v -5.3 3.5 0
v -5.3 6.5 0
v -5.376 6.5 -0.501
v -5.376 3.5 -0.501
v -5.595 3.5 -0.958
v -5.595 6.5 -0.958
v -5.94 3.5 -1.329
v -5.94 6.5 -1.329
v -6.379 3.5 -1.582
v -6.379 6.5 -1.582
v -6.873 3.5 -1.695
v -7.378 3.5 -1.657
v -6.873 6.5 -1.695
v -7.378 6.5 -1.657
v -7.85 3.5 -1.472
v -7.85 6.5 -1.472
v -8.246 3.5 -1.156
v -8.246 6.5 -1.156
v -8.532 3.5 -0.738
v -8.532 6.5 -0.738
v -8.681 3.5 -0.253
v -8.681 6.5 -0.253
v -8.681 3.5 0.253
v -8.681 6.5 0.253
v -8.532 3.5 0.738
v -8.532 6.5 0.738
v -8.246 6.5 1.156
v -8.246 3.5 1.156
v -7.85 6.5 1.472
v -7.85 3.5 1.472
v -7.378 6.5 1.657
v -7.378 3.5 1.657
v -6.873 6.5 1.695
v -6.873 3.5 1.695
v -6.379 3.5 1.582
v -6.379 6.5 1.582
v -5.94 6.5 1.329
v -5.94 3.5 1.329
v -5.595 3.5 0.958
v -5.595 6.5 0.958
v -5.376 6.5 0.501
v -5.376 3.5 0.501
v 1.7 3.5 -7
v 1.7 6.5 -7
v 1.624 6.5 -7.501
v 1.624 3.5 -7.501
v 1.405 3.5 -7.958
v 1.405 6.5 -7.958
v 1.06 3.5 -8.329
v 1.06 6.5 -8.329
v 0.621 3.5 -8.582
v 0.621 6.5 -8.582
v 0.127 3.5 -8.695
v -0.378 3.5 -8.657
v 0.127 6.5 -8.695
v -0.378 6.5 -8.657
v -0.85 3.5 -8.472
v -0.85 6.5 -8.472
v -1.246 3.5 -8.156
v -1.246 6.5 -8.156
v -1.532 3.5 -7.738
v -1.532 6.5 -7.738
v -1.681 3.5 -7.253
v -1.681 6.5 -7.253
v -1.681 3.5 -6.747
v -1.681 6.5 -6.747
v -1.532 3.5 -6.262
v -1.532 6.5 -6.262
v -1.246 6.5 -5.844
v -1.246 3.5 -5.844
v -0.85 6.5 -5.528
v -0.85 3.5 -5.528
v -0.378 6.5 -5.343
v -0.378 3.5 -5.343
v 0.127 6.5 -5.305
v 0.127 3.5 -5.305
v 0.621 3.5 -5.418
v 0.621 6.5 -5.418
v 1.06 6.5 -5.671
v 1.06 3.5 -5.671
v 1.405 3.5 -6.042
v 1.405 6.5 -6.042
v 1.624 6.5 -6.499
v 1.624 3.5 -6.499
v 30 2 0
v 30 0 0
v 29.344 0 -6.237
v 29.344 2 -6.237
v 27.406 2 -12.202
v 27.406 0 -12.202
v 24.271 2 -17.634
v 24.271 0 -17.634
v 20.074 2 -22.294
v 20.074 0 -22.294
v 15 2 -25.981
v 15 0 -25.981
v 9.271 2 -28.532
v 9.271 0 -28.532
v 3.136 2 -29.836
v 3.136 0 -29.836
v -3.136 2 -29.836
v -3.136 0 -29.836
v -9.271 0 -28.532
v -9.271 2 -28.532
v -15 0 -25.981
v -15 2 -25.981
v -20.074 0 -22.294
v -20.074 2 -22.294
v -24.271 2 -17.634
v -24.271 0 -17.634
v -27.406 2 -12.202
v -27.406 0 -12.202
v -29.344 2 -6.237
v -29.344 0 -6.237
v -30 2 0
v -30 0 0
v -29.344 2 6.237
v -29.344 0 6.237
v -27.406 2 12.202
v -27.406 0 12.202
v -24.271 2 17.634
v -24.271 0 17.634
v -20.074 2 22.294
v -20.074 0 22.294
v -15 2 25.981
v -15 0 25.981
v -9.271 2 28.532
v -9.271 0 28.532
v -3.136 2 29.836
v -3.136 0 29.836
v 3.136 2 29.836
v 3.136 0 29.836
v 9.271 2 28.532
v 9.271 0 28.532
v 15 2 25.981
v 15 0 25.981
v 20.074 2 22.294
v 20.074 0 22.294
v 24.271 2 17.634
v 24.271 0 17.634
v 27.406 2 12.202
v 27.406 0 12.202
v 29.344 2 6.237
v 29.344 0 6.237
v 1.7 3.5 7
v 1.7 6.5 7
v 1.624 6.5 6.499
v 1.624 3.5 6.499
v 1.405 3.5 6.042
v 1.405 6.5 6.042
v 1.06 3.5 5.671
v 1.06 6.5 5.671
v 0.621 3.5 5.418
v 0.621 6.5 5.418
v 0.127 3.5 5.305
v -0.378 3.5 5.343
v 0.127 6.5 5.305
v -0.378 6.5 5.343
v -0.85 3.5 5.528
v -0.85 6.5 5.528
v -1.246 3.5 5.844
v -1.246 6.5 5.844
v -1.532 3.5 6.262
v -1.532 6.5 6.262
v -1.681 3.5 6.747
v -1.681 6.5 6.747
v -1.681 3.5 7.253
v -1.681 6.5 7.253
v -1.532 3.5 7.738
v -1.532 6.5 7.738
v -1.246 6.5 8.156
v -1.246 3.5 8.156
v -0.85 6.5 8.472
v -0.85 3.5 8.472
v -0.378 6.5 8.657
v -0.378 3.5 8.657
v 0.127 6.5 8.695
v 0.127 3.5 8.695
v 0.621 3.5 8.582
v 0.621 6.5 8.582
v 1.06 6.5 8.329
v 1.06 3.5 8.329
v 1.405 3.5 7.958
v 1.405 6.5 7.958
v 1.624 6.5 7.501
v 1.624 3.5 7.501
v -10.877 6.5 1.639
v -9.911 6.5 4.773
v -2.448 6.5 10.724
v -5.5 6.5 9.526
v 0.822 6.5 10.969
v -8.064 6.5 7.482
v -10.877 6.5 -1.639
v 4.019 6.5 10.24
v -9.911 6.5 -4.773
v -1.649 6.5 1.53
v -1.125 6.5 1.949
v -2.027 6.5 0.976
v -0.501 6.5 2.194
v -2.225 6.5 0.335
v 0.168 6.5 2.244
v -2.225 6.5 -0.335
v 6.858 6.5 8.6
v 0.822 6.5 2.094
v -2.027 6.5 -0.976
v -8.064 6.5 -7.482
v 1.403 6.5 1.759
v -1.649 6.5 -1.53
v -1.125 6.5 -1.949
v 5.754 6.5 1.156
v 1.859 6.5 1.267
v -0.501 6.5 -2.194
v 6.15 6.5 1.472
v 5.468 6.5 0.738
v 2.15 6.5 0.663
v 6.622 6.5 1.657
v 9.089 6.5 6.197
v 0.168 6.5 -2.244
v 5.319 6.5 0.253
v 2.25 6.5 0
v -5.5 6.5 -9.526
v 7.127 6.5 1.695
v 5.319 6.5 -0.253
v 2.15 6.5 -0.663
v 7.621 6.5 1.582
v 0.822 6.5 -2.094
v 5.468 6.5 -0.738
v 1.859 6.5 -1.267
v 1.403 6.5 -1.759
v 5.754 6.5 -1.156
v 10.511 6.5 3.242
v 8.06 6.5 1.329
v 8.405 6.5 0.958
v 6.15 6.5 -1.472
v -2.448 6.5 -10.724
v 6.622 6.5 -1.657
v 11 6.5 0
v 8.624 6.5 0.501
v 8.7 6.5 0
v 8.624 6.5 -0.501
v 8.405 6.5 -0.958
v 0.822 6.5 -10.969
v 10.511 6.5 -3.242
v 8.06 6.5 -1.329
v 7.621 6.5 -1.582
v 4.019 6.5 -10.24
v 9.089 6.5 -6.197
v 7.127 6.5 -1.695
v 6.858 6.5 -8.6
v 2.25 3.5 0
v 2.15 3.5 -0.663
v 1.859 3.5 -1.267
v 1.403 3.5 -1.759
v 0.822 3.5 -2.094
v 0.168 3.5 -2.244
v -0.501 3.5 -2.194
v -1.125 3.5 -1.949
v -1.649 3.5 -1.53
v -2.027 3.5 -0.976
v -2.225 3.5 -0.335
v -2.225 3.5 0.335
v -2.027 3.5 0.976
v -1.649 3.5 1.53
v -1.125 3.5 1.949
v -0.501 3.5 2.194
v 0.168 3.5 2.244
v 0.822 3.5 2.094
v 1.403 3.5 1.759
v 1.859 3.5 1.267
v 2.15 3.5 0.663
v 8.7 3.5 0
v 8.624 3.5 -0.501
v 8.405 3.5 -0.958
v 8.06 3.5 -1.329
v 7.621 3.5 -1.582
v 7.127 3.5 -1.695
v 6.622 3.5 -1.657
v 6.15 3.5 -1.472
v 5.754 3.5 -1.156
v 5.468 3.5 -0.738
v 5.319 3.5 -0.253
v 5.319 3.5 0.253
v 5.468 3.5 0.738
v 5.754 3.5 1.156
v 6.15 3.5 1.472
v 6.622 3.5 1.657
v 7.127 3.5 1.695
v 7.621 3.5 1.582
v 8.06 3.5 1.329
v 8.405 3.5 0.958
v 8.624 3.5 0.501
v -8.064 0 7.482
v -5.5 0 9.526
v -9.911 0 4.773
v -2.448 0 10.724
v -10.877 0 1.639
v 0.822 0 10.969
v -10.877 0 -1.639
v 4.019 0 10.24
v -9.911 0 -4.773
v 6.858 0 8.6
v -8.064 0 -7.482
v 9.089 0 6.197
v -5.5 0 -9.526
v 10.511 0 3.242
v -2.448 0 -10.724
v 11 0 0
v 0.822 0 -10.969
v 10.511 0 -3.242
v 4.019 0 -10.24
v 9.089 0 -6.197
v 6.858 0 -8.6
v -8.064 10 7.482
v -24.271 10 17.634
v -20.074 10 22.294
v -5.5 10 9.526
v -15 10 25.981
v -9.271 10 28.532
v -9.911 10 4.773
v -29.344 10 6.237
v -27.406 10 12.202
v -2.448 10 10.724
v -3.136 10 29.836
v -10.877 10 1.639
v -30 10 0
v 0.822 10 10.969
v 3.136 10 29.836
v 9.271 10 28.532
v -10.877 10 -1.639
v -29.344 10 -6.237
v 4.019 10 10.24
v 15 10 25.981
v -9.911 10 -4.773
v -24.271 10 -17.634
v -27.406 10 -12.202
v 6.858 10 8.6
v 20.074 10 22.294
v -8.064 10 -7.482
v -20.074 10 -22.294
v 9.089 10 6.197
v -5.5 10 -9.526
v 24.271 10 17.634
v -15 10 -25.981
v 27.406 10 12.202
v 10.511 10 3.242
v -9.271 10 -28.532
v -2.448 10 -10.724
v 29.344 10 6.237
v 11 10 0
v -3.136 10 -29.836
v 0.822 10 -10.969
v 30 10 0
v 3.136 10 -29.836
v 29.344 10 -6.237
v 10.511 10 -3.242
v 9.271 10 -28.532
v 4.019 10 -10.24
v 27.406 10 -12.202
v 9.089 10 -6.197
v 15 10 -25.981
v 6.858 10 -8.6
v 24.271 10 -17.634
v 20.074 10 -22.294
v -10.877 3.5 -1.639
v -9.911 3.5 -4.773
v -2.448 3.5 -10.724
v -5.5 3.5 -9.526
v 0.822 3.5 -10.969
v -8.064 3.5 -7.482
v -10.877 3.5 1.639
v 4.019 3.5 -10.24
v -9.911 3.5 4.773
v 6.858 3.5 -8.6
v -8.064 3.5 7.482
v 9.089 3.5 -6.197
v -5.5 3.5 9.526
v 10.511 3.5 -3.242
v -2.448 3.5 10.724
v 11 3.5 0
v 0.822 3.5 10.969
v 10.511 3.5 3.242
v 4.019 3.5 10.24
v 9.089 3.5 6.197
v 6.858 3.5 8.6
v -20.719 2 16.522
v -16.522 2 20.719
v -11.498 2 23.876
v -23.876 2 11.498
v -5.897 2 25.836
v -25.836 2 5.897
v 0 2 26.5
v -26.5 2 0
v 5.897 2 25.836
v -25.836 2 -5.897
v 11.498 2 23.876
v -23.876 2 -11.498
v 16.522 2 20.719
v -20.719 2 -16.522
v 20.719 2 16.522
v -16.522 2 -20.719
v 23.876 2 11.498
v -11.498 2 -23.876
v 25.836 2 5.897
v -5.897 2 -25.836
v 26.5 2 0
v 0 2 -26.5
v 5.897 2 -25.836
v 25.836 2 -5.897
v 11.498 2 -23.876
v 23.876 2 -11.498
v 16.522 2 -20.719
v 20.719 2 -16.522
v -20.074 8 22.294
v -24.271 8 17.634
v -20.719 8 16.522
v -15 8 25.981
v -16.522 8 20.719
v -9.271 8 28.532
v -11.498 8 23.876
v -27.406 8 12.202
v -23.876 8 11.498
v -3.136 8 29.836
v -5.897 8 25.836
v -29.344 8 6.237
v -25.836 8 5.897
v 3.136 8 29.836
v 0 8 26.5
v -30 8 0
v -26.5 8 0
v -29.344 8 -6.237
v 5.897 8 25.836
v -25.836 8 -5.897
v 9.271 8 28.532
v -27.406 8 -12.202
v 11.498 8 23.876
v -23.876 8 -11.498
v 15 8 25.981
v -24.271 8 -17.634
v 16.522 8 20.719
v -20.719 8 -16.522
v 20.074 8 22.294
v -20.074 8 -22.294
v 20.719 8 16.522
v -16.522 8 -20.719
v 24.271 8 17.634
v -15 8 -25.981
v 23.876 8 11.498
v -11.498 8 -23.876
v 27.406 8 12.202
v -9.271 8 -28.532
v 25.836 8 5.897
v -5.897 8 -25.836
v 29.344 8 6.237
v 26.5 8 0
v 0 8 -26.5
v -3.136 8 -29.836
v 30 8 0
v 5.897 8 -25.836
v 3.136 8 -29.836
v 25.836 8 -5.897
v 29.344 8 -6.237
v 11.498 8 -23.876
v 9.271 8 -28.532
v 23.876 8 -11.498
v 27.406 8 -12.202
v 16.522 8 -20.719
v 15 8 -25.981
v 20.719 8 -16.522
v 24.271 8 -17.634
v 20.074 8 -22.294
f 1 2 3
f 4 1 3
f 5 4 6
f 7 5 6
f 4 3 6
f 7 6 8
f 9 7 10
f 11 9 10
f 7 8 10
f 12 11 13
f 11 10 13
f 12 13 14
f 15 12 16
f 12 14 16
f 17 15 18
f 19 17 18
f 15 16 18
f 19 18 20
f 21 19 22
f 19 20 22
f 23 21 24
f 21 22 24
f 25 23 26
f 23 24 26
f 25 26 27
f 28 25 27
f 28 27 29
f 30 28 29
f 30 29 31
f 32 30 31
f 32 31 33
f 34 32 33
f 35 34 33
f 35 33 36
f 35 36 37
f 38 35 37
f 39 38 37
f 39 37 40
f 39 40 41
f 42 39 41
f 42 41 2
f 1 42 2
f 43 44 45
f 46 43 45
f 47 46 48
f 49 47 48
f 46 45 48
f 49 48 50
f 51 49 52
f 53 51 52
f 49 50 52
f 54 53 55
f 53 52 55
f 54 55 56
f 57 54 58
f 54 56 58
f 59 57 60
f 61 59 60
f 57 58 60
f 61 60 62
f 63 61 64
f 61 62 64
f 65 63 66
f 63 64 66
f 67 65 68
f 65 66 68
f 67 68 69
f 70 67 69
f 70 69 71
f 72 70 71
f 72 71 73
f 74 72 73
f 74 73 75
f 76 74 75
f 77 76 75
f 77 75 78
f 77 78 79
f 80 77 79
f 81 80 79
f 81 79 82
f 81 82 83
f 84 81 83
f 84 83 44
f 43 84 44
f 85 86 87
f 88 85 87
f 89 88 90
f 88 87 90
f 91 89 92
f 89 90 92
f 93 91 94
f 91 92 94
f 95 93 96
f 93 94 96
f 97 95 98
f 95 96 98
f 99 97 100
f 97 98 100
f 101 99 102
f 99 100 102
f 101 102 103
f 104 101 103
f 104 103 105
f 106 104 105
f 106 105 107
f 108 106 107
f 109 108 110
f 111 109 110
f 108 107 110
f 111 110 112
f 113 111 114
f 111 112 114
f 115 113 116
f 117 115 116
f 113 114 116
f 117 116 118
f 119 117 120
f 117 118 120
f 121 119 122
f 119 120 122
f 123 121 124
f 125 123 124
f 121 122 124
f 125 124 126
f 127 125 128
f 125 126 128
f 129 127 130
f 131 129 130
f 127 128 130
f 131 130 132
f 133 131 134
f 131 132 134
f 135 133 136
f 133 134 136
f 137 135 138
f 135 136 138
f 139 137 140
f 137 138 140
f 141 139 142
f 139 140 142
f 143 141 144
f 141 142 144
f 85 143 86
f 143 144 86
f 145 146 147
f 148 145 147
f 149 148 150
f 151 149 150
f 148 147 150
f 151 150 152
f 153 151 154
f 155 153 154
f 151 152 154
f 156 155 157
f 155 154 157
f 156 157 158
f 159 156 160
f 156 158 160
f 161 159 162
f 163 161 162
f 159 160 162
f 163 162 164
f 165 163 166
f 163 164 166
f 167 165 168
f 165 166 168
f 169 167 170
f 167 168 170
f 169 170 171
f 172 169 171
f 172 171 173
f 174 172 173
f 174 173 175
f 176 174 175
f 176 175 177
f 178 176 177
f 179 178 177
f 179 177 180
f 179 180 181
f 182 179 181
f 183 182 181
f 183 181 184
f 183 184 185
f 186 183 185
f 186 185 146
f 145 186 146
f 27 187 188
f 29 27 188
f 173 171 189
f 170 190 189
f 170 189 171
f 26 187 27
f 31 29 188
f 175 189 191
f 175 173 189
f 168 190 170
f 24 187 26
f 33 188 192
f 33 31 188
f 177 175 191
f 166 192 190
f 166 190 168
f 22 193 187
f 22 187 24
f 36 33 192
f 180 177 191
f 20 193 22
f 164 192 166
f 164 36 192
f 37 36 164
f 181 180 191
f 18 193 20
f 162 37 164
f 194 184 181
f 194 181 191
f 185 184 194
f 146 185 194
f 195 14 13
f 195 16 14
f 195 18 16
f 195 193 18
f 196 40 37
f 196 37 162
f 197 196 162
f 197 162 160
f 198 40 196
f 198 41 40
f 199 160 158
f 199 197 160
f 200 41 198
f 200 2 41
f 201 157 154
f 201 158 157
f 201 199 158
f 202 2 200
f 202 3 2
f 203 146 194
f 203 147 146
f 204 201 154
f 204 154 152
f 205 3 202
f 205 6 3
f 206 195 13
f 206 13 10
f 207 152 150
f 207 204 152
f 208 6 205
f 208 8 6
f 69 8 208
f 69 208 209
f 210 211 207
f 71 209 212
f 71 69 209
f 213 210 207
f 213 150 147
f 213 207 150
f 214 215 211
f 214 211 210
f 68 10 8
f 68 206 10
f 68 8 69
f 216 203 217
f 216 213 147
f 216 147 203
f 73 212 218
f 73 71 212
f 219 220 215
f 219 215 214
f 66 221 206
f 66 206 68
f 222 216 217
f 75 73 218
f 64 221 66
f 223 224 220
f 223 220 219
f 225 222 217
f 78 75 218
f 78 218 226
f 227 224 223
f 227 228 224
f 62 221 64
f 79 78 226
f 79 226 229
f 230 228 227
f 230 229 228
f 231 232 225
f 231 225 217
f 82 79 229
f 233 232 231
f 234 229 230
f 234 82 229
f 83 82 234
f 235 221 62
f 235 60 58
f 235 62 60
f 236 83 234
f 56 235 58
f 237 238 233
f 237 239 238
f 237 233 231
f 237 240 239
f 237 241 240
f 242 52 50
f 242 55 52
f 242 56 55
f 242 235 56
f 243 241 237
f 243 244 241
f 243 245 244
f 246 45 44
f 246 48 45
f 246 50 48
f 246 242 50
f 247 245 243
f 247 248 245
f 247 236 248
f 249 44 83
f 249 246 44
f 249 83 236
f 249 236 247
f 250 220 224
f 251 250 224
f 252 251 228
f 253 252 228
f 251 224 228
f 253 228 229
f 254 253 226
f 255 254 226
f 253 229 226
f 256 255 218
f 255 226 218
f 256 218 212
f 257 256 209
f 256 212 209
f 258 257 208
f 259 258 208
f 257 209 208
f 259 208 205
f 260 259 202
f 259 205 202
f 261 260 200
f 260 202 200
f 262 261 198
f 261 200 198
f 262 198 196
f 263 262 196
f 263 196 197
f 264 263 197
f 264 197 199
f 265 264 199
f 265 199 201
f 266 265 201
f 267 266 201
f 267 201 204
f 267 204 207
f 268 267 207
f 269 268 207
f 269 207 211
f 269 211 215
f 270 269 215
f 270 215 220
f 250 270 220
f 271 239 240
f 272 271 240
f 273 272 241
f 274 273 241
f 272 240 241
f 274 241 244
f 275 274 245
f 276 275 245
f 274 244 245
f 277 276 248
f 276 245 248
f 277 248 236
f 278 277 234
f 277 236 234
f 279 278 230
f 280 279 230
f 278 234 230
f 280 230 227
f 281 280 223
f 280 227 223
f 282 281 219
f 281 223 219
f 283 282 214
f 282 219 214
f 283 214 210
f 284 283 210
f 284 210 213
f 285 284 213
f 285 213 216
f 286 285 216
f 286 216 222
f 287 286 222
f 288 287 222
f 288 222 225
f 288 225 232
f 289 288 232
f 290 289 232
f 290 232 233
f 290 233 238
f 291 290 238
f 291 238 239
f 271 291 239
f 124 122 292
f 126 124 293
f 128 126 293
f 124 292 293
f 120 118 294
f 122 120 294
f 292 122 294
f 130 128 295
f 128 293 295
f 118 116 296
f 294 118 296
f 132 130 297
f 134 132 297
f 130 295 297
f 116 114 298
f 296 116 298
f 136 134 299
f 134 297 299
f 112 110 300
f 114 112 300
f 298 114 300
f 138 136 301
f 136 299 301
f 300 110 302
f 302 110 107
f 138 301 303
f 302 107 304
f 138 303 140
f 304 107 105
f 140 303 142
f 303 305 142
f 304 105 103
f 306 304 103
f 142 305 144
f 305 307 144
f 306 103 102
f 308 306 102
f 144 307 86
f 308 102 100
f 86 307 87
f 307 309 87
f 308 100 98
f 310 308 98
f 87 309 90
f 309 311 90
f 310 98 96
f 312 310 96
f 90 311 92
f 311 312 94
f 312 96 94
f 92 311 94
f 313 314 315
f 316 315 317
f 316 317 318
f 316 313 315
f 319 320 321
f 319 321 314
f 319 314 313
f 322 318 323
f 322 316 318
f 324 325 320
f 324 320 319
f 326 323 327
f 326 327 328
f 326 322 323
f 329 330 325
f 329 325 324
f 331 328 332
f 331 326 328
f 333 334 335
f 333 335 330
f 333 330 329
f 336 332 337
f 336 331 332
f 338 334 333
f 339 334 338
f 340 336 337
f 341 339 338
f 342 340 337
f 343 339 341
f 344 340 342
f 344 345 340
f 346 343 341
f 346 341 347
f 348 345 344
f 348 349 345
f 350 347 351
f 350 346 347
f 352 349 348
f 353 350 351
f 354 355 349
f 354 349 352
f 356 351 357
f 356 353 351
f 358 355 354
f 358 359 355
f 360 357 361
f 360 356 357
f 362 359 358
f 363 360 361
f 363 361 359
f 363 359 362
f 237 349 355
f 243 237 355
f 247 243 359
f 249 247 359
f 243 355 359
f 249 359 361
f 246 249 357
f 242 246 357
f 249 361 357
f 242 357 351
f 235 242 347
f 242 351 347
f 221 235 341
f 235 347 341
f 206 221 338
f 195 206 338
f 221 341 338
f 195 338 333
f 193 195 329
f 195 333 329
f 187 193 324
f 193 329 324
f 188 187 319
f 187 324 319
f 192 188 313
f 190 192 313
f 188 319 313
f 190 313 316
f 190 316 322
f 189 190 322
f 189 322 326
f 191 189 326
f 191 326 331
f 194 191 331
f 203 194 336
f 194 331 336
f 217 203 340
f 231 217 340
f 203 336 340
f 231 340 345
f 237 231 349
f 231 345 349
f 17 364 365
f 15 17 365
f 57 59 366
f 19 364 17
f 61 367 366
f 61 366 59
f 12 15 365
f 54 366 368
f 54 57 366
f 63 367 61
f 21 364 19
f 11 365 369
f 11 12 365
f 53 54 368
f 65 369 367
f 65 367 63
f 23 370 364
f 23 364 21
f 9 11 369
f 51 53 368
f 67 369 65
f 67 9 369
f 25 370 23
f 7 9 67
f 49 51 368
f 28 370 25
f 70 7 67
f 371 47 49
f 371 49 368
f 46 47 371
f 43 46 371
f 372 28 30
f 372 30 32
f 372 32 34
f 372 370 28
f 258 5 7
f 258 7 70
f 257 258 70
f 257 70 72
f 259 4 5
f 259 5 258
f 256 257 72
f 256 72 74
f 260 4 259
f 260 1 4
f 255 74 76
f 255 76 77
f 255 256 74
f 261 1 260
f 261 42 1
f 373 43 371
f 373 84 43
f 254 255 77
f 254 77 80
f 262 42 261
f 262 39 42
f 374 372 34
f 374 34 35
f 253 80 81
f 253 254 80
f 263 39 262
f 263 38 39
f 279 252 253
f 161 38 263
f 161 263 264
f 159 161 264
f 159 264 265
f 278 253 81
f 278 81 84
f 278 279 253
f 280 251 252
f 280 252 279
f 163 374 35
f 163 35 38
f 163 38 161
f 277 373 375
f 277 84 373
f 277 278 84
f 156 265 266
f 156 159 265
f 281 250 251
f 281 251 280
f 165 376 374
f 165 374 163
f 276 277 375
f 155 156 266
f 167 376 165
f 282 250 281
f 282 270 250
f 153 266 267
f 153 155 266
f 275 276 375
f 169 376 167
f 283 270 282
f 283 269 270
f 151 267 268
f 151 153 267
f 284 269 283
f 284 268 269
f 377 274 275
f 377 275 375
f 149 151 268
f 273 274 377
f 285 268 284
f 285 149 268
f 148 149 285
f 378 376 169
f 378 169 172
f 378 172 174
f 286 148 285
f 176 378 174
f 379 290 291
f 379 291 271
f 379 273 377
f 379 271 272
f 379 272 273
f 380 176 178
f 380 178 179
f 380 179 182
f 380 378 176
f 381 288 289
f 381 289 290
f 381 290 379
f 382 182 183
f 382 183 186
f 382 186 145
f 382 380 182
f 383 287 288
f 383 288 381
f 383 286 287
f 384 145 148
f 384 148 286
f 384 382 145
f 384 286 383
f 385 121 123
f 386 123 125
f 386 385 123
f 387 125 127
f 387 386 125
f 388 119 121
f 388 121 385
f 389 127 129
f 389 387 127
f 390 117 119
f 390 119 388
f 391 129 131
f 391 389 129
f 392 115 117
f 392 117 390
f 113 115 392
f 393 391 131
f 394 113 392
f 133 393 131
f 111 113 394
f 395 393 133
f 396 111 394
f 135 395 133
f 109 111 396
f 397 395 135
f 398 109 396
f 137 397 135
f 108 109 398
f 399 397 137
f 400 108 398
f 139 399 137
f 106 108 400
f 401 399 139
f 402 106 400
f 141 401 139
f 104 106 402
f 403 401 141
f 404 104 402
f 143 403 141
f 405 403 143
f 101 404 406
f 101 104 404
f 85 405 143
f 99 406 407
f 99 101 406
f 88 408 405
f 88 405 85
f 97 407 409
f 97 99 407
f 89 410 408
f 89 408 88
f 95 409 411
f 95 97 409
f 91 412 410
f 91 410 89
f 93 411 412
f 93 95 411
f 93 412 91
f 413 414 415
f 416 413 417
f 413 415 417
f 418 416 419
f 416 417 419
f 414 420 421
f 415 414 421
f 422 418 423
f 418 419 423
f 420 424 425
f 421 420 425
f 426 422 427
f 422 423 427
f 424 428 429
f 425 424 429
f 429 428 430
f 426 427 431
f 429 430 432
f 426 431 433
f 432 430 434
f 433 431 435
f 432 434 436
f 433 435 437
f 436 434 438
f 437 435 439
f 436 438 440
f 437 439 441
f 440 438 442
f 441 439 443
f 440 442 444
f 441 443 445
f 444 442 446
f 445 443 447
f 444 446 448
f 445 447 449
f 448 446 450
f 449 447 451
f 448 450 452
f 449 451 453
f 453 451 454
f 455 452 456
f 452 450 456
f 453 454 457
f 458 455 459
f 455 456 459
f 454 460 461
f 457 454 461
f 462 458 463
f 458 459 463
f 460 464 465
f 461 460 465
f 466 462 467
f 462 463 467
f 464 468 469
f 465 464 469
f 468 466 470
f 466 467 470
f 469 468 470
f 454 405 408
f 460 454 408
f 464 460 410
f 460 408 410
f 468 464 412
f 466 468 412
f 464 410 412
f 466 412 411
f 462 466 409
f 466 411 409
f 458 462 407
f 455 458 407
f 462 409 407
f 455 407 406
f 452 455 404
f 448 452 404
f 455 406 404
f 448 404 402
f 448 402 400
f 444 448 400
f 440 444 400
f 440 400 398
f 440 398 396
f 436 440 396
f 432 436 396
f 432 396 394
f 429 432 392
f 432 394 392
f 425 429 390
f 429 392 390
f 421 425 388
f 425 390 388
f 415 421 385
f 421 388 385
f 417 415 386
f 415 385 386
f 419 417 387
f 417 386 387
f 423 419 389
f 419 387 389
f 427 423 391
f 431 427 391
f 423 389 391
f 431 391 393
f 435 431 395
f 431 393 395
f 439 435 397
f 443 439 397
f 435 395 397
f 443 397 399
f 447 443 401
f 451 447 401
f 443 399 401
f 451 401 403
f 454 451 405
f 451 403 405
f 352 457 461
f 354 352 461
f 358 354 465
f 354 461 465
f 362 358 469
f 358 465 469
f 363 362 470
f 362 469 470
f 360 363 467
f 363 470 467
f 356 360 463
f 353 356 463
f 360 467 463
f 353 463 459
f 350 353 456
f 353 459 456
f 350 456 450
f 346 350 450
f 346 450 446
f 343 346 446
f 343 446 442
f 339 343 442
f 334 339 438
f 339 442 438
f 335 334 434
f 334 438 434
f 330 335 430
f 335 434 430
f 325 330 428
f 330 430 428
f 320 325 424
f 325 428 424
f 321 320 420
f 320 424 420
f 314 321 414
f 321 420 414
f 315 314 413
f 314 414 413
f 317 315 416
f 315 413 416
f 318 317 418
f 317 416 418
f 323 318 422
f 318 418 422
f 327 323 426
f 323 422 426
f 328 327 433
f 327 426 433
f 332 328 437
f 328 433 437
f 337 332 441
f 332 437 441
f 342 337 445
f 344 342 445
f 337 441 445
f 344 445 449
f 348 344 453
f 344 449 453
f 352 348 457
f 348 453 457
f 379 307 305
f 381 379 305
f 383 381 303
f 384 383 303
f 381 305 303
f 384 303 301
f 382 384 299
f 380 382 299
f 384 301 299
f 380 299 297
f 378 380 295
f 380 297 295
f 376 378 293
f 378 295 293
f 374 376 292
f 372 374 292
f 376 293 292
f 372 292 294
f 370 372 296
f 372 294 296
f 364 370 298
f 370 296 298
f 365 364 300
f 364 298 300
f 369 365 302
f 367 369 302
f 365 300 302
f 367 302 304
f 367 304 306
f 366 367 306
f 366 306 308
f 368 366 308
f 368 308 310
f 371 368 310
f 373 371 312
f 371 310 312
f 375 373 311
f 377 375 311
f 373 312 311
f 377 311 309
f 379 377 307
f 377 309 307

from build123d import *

# Parameters (mm, degrees)
SKETCH1_R           = 30
EXTRUDE_C_DEPTH     = 2
SKETCH2_R           = 26.5
BOSS_EXTRUDE2_DEPTH = 6
SKETCH3_R           = 30
BOSS_EXTRUDE3_DEPTH = 2
SKETCH8_R           = 11
CUT_EXTRUDE2_DEPTH  = 3.5
SKETCH9_R           = 11
CUT_EXTRUDE3_DEPTH  = 3.5
SKETCH10_R          = 2.25
CUT_EXTRUDE4_DEPTH  = 12.5
SKETCH12_R          = 1.7
CUT_EXTRUDE5_DEPTH  = 10


with BuildPart() as part:
    # Sketch1 → Extrude c (new body)
    with BuildSketch(Plane(origin=(0, 0, 0), x_dir=(1, 0, 0), z_dir=(0, 1, 0))):
        Circle(SKETCH1_R)
    extrude(amount=EXTRUDE_C_DEPTH)

    # Sketch2 → Boss-Extrude2 (add)
    with BuildSketch(Plane(origin=(0, 2, 0), x_dir=(1, 0, 0), z_dir=(0, 1, 0))):
        Circle(SKETCH2_R)
    extrude(amount=BOSS_EXTRUDE2_DEPTH)

    # Sketch3 → Boss-Extrude3 (add)
    with BuildSketch(Plane(origin=(0, 8, 0), x_dir=(1, 0, 0), z_dir=(0, 1, 0))):
        Circle(SKETCH3_R)
    extrude(amount=BOSS_EXTRUDE3_DEPTH)

    # Sketch8 → Cut-Extrude2 (cut)
    with BuildSketch(Plane.XZ):
        Circle(SKETCH8_R)
    extrude(amount=-CUT_EXTRUDE2_DEPTH, mode=Mode.SUBTRACT)

    # Sketch9 → Cut-Extrude3 (cut)
    with BuildSketch(Plane(origin=(0, 10, 0), x_dir=(1, 0, 0), z_dir=(0, 1, 0))):
        Circle(SKETCH9_R)
    extrude(amount=-CUT_EXTRUDE3_DEPTH, mode=Mode.SUBTRACT)

    # Sketch10 → Cut-Extrude4 (cut)
    with BuildSketch(Plane(origin=(0, 6.5, 0), x_dir=(1, 0, 0), z_dir=(0, 1, 0))):
        Circle(SKETCH10_R)
    extrude(amount=-CUT_EXTRUDE4_DEPTH, mode=Mode.SUBTRACT)

    # Sketch12 → Cut-Extrude5 (cut)
    with BuildSketch(Plane(origin=(0, 6.5, 0), x_dir=(1, 0, 0), z_dir=(0, 1, 0))):
        with Locations((0, 7)):
            Circle(SKETCH12_R)
        with Locations((7, 0)):
            Circle(SKETCH12_R)
        with Locations((0, -7)):
            Circle(SKETCH12_R)
        with Locations((-7, 0)):
            Circle(SKETCH12_R)
    extrude(amount=-CUT_EXTRUDE5_DEPTH, mode=Mode.SUBTRACT)


solid = part.part
